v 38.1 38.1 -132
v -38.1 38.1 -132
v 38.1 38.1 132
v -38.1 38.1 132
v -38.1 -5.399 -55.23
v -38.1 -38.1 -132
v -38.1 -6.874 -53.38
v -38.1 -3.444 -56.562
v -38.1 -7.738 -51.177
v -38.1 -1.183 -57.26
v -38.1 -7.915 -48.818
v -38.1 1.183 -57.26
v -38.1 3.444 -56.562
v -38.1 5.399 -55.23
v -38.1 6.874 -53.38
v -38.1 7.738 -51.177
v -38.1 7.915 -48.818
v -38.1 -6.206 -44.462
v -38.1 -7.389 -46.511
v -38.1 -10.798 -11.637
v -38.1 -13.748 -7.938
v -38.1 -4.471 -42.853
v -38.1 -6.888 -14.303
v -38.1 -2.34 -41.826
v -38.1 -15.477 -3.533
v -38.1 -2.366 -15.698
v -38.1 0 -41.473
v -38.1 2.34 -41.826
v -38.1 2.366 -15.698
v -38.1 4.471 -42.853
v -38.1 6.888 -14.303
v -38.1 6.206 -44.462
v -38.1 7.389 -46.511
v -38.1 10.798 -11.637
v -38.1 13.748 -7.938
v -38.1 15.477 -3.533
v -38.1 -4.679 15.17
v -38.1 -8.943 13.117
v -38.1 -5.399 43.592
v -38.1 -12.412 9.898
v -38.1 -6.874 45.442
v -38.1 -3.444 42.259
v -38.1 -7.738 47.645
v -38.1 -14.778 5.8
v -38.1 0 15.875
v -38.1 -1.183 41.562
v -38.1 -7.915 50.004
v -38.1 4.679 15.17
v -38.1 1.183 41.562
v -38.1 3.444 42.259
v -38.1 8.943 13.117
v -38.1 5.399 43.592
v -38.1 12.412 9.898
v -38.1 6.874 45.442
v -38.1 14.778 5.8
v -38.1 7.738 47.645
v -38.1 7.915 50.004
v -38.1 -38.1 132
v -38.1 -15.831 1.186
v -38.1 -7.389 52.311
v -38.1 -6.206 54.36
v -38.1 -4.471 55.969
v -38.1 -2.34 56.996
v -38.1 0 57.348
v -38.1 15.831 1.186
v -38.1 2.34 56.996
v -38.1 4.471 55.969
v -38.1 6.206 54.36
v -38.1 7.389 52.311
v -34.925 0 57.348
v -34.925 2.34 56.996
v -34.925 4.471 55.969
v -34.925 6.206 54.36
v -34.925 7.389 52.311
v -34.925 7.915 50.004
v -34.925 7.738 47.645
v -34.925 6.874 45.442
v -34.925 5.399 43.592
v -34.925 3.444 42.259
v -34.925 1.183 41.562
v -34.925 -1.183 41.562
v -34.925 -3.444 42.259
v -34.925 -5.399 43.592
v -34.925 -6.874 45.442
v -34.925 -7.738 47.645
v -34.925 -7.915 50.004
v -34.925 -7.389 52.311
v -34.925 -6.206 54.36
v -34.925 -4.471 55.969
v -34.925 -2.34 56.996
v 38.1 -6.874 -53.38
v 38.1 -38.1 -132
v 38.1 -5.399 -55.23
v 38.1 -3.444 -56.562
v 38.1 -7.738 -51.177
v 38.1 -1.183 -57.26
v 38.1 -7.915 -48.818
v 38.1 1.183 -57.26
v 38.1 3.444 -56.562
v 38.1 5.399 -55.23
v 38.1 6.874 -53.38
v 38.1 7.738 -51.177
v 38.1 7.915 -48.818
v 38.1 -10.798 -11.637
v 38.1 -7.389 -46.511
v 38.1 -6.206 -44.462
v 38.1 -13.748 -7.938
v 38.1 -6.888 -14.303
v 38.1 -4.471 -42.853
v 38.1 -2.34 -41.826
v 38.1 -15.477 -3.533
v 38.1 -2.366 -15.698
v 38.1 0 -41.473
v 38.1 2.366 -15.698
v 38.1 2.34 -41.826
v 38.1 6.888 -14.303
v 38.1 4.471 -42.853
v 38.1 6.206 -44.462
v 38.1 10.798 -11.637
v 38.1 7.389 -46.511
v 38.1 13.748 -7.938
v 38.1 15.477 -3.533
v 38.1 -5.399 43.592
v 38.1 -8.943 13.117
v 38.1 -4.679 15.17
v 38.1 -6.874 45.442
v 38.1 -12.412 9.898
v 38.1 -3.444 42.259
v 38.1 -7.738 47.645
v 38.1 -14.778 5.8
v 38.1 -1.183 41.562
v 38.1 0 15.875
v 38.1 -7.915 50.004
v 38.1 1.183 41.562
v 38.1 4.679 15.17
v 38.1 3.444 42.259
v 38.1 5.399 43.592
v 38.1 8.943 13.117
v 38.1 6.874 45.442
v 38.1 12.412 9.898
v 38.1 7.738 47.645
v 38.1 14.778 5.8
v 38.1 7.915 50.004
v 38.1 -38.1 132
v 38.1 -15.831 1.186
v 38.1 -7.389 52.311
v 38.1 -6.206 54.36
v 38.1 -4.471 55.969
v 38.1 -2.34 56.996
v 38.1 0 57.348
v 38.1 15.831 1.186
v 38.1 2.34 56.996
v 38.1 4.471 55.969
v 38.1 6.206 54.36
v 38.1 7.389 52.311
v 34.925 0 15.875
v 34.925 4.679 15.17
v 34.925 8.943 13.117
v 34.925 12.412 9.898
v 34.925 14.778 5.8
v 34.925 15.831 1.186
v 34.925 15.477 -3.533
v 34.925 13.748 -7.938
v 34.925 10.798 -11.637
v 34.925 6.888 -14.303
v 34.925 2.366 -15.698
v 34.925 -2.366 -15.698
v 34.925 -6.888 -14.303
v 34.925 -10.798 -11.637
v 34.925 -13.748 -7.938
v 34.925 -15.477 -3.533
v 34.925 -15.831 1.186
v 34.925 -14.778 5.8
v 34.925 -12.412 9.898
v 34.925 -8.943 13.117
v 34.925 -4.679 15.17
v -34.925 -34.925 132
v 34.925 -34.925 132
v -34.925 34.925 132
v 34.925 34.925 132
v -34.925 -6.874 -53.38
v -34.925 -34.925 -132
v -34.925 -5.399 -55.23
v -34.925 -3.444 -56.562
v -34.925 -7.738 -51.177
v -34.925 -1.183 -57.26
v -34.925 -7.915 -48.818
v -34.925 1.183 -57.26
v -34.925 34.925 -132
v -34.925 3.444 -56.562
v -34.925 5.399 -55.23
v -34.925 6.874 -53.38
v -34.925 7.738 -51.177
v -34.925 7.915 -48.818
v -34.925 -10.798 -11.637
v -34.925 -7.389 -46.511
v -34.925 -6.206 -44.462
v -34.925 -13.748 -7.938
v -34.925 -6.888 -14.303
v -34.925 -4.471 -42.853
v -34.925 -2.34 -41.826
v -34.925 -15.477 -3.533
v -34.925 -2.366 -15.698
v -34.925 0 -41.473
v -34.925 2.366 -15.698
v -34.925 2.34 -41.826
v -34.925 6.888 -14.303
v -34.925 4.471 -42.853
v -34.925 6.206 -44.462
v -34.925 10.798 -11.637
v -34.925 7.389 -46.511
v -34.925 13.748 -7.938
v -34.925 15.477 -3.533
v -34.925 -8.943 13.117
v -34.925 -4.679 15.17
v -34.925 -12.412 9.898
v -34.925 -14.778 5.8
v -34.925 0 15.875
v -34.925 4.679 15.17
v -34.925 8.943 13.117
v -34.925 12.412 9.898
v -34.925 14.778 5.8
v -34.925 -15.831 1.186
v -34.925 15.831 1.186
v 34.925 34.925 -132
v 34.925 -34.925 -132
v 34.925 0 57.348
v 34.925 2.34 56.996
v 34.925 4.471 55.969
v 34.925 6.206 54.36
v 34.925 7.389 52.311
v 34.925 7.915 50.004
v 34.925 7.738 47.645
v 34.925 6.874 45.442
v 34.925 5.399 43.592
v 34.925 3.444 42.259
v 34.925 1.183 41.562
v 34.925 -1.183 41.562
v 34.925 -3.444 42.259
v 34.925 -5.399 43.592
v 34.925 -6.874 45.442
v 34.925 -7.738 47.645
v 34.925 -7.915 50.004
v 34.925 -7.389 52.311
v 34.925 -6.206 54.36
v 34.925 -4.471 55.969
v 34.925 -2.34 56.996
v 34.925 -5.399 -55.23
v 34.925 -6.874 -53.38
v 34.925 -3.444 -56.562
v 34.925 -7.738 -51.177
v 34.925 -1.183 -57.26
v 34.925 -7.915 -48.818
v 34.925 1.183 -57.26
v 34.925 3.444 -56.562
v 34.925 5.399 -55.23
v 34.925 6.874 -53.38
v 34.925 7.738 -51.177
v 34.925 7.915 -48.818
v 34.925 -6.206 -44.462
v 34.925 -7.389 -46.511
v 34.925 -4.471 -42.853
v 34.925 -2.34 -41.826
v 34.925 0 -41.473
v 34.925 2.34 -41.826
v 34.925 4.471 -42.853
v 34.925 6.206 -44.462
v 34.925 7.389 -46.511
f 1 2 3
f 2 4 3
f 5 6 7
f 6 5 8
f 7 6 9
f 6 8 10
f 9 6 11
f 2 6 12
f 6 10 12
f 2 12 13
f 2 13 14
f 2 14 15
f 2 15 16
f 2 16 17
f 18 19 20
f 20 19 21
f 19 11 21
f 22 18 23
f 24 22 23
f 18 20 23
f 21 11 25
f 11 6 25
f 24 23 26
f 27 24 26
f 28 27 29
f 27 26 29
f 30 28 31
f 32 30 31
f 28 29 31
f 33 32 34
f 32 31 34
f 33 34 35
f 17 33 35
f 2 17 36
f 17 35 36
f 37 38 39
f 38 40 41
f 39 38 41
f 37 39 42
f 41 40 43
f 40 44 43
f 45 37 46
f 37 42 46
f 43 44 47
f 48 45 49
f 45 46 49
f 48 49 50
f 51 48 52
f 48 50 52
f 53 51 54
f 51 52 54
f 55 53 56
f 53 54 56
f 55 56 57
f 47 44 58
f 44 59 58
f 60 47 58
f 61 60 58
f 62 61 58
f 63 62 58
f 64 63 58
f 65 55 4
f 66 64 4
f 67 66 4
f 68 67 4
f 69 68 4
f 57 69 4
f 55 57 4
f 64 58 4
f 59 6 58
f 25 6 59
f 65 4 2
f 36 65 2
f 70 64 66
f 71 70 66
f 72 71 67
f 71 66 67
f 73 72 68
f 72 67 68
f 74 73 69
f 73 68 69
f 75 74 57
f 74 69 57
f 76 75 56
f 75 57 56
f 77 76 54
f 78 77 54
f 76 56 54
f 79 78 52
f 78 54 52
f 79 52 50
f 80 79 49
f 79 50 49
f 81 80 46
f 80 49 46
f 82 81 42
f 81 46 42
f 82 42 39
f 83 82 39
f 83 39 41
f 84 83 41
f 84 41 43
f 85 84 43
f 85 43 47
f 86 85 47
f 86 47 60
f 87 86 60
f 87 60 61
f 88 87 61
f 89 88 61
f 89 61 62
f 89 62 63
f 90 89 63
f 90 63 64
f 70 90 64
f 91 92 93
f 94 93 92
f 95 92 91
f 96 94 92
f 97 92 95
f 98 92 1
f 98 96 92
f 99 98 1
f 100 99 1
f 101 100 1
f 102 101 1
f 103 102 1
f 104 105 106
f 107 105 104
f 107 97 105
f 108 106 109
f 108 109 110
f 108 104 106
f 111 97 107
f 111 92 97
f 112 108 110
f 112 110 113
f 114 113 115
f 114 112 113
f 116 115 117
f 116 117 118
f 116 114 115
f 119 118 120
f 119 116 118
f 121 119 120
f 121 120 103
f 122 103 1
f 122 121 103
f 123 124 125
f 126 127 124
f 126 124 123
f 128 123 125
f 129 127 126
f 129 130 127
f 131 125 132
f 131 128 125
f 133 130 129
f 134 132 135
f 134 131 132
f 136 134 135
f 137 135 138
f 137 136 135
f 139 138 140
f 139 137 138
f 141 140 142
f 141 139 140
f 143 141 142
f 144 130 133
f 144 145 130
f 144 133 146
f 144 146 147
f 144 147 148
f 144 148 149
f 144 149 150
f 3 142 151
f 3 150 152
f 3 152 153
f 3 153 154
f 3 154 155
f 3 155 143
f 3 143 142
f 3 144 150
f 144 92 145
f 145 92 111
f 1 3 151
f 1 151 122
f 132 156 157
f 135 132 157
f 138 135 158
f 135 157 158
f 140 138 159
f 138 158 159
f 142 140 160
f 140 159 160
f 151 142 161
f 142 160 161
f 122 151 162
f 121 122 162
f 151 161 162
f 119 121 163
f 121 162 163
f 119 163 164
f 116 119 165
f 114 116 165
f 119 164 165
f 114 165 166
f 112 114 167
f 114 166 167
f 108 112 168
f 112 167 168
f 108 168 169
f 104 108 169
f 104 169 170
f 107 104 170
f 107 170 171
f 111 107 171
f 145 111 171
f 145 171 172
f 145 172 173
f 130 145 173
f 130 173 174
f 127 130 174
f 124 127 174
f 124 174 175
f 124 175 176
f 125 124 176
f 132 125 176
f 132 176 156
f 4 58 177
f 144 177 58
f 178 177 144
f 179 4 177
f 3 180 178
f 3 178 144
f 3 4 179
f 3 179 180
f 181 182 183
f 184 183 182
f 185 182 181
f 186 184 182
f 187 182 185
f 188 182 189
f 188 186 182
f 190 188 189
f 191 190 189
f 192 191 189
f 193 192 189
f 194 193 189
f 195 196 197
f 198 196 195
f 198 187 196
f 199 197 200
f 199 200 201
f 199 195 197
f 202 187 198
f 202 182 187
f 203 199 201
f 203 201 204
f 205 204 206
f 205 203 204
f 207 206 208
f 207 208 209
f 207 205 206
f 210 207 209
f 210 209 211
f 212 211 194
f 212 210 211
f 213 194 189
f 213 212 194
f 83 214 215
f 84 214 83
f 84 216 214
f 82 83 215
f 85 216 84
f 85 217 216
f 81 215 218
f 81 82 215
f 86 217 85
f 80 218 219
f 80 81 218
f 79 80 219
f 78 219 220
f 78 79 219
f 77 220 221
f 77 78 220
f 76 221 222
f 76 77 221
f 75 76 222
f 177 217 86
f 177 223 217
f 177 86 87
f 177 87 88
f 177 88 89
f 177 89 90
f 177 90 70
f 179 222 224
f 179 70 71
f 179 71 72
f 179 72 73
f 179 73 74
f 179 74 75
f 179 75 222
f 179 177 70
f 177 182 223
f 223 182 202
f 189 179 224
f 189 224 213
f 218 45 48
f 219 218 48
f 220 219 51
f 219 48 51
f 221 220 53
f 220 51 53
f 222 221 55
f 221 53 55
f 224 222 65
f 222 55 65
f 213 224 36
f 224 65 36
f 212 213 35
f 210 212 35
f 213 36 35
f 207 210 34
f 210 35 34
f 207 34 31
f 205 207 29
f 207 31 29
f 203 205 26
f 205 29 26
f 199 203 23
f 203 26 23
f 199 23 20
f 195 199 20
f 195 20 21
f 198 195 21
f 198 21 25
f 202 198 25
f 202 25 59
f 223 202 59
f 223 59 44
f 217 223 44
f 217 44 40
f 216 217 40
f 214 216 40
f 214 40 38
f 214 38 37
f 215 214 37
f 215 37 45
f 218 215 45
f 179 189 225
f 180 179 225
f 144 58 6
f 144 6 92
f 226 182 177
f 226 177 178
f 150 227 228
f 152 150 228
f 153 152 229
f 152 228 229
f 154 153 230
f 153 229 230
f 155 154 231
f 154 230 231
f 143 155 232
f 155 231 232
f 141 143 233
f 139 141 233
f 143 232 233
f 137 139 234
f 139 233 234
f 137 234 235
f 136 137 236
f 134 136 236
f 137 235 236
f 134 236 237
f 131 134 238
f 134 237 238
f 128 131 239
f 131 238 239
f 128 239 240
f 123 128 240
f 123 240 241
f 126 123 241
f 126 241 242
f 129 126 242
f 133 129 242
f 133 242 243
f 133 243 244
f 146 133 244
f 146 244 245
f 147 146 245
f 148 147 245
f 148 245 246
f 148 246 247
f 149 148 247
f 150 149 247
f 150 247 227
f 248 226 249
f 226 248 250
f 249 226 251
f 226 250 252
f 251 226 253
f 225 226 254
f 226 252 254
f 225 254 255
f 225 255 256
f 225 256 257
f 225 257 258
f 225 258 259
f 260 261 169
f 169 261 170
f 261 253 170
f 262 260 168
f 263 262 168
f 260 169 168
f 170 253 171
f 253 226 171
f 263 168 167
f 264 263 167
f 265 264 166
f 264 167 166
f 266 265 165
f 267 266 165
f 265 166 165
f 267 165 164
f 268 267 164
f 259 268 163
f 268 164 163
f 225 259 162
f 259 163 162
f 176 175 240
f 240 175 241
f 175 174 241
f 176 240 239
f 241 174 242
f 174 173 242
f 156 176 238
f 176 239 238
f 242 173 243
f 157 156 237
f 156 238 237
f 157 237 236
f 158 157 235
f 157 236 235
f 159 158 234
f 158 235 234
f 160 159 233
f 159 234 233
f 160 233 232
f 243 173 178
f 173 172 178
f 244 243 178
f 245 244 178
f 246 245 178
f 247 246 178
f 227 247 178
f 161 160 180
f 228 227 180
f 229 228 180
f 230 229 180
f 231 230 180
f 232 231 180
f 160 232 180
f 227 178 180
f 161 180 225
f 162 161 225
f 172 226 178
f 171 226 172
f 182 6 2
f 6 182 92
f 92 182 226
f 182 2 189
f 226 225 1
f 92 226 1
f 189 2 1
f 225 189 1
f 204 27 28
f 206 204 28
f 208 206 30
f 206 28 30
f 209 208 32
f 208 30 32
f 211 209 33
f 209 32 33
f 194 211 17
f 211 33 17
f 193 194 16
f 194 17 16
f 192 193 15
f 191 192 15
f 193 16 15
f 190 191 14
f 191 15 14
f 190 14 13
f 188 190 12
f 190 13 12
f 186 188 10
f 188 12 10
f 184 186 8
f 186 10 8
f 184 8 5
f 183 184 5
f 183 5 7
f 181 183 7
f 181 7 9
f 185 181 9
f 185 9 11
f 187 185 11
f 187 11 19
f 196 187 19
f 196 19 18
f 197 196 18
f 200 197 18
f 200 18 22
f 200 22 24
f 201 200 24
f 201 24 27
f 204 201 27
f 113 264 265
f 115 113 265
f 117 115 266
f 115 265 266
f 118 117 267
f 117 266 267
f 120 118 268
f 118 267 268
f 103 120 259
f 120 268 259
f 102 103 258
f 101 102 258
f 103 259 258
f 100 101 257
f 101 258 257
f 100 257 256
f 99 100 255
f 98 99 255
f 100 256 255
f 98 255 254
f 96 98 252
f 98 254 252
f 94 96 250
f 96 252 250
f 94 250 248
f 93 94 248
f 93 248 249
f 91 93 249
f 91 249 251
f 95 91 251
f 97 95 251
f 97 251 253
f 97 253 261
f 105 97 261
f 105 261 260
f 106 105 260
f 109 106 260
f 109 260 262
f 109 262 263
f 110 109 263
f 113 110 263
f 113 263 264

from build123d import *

# Parameters (mm, degrees)
SKETCH1_W           = 76.2
SKETCH1_H           = 76.2
SKETCH1_W_2         = 69.85
SKETCH1_H_2         = 69.85
BOSS_EXTRUDE1_DEPTH = 132
SKETCH2_R           = 15.875
SKETCH2_R_2         = 7.9375
CUT_EXTRUDE1_DEPTH  = 158.105219519


with BuildPart() as part:
    # Sketch1 → Boss-Extrude1 (new, symmetric)
    with BuildSketch(Plane.XY):
        Rectangle(SKETCH1_W, SKETCH1_H)
        Rectangle(SKETCH1_W_2, SKETCH1_H_2, mode=Mode.SUBTRACT)
    extrude(amount=BOSS_EXTRUDE1_DEPTH, both=True)

    # Sketch2 → Cut-Extrude1 (cut, through all)
    with BuildSketch(Plane.ZY.offset(38.1)):
        Circle(SKETCH2_R)
        with Locations((-49.4109375, 0)):
            Circle(SKETCH2_R_2)
        with Locations((49.4109375, 0)):
            Circle(SKETCH2_R_2)
    extrude(amount=-CUT_EXTRUDE1_DEPTH, mode=Mode.SUBTRACT)


solid = part.part
